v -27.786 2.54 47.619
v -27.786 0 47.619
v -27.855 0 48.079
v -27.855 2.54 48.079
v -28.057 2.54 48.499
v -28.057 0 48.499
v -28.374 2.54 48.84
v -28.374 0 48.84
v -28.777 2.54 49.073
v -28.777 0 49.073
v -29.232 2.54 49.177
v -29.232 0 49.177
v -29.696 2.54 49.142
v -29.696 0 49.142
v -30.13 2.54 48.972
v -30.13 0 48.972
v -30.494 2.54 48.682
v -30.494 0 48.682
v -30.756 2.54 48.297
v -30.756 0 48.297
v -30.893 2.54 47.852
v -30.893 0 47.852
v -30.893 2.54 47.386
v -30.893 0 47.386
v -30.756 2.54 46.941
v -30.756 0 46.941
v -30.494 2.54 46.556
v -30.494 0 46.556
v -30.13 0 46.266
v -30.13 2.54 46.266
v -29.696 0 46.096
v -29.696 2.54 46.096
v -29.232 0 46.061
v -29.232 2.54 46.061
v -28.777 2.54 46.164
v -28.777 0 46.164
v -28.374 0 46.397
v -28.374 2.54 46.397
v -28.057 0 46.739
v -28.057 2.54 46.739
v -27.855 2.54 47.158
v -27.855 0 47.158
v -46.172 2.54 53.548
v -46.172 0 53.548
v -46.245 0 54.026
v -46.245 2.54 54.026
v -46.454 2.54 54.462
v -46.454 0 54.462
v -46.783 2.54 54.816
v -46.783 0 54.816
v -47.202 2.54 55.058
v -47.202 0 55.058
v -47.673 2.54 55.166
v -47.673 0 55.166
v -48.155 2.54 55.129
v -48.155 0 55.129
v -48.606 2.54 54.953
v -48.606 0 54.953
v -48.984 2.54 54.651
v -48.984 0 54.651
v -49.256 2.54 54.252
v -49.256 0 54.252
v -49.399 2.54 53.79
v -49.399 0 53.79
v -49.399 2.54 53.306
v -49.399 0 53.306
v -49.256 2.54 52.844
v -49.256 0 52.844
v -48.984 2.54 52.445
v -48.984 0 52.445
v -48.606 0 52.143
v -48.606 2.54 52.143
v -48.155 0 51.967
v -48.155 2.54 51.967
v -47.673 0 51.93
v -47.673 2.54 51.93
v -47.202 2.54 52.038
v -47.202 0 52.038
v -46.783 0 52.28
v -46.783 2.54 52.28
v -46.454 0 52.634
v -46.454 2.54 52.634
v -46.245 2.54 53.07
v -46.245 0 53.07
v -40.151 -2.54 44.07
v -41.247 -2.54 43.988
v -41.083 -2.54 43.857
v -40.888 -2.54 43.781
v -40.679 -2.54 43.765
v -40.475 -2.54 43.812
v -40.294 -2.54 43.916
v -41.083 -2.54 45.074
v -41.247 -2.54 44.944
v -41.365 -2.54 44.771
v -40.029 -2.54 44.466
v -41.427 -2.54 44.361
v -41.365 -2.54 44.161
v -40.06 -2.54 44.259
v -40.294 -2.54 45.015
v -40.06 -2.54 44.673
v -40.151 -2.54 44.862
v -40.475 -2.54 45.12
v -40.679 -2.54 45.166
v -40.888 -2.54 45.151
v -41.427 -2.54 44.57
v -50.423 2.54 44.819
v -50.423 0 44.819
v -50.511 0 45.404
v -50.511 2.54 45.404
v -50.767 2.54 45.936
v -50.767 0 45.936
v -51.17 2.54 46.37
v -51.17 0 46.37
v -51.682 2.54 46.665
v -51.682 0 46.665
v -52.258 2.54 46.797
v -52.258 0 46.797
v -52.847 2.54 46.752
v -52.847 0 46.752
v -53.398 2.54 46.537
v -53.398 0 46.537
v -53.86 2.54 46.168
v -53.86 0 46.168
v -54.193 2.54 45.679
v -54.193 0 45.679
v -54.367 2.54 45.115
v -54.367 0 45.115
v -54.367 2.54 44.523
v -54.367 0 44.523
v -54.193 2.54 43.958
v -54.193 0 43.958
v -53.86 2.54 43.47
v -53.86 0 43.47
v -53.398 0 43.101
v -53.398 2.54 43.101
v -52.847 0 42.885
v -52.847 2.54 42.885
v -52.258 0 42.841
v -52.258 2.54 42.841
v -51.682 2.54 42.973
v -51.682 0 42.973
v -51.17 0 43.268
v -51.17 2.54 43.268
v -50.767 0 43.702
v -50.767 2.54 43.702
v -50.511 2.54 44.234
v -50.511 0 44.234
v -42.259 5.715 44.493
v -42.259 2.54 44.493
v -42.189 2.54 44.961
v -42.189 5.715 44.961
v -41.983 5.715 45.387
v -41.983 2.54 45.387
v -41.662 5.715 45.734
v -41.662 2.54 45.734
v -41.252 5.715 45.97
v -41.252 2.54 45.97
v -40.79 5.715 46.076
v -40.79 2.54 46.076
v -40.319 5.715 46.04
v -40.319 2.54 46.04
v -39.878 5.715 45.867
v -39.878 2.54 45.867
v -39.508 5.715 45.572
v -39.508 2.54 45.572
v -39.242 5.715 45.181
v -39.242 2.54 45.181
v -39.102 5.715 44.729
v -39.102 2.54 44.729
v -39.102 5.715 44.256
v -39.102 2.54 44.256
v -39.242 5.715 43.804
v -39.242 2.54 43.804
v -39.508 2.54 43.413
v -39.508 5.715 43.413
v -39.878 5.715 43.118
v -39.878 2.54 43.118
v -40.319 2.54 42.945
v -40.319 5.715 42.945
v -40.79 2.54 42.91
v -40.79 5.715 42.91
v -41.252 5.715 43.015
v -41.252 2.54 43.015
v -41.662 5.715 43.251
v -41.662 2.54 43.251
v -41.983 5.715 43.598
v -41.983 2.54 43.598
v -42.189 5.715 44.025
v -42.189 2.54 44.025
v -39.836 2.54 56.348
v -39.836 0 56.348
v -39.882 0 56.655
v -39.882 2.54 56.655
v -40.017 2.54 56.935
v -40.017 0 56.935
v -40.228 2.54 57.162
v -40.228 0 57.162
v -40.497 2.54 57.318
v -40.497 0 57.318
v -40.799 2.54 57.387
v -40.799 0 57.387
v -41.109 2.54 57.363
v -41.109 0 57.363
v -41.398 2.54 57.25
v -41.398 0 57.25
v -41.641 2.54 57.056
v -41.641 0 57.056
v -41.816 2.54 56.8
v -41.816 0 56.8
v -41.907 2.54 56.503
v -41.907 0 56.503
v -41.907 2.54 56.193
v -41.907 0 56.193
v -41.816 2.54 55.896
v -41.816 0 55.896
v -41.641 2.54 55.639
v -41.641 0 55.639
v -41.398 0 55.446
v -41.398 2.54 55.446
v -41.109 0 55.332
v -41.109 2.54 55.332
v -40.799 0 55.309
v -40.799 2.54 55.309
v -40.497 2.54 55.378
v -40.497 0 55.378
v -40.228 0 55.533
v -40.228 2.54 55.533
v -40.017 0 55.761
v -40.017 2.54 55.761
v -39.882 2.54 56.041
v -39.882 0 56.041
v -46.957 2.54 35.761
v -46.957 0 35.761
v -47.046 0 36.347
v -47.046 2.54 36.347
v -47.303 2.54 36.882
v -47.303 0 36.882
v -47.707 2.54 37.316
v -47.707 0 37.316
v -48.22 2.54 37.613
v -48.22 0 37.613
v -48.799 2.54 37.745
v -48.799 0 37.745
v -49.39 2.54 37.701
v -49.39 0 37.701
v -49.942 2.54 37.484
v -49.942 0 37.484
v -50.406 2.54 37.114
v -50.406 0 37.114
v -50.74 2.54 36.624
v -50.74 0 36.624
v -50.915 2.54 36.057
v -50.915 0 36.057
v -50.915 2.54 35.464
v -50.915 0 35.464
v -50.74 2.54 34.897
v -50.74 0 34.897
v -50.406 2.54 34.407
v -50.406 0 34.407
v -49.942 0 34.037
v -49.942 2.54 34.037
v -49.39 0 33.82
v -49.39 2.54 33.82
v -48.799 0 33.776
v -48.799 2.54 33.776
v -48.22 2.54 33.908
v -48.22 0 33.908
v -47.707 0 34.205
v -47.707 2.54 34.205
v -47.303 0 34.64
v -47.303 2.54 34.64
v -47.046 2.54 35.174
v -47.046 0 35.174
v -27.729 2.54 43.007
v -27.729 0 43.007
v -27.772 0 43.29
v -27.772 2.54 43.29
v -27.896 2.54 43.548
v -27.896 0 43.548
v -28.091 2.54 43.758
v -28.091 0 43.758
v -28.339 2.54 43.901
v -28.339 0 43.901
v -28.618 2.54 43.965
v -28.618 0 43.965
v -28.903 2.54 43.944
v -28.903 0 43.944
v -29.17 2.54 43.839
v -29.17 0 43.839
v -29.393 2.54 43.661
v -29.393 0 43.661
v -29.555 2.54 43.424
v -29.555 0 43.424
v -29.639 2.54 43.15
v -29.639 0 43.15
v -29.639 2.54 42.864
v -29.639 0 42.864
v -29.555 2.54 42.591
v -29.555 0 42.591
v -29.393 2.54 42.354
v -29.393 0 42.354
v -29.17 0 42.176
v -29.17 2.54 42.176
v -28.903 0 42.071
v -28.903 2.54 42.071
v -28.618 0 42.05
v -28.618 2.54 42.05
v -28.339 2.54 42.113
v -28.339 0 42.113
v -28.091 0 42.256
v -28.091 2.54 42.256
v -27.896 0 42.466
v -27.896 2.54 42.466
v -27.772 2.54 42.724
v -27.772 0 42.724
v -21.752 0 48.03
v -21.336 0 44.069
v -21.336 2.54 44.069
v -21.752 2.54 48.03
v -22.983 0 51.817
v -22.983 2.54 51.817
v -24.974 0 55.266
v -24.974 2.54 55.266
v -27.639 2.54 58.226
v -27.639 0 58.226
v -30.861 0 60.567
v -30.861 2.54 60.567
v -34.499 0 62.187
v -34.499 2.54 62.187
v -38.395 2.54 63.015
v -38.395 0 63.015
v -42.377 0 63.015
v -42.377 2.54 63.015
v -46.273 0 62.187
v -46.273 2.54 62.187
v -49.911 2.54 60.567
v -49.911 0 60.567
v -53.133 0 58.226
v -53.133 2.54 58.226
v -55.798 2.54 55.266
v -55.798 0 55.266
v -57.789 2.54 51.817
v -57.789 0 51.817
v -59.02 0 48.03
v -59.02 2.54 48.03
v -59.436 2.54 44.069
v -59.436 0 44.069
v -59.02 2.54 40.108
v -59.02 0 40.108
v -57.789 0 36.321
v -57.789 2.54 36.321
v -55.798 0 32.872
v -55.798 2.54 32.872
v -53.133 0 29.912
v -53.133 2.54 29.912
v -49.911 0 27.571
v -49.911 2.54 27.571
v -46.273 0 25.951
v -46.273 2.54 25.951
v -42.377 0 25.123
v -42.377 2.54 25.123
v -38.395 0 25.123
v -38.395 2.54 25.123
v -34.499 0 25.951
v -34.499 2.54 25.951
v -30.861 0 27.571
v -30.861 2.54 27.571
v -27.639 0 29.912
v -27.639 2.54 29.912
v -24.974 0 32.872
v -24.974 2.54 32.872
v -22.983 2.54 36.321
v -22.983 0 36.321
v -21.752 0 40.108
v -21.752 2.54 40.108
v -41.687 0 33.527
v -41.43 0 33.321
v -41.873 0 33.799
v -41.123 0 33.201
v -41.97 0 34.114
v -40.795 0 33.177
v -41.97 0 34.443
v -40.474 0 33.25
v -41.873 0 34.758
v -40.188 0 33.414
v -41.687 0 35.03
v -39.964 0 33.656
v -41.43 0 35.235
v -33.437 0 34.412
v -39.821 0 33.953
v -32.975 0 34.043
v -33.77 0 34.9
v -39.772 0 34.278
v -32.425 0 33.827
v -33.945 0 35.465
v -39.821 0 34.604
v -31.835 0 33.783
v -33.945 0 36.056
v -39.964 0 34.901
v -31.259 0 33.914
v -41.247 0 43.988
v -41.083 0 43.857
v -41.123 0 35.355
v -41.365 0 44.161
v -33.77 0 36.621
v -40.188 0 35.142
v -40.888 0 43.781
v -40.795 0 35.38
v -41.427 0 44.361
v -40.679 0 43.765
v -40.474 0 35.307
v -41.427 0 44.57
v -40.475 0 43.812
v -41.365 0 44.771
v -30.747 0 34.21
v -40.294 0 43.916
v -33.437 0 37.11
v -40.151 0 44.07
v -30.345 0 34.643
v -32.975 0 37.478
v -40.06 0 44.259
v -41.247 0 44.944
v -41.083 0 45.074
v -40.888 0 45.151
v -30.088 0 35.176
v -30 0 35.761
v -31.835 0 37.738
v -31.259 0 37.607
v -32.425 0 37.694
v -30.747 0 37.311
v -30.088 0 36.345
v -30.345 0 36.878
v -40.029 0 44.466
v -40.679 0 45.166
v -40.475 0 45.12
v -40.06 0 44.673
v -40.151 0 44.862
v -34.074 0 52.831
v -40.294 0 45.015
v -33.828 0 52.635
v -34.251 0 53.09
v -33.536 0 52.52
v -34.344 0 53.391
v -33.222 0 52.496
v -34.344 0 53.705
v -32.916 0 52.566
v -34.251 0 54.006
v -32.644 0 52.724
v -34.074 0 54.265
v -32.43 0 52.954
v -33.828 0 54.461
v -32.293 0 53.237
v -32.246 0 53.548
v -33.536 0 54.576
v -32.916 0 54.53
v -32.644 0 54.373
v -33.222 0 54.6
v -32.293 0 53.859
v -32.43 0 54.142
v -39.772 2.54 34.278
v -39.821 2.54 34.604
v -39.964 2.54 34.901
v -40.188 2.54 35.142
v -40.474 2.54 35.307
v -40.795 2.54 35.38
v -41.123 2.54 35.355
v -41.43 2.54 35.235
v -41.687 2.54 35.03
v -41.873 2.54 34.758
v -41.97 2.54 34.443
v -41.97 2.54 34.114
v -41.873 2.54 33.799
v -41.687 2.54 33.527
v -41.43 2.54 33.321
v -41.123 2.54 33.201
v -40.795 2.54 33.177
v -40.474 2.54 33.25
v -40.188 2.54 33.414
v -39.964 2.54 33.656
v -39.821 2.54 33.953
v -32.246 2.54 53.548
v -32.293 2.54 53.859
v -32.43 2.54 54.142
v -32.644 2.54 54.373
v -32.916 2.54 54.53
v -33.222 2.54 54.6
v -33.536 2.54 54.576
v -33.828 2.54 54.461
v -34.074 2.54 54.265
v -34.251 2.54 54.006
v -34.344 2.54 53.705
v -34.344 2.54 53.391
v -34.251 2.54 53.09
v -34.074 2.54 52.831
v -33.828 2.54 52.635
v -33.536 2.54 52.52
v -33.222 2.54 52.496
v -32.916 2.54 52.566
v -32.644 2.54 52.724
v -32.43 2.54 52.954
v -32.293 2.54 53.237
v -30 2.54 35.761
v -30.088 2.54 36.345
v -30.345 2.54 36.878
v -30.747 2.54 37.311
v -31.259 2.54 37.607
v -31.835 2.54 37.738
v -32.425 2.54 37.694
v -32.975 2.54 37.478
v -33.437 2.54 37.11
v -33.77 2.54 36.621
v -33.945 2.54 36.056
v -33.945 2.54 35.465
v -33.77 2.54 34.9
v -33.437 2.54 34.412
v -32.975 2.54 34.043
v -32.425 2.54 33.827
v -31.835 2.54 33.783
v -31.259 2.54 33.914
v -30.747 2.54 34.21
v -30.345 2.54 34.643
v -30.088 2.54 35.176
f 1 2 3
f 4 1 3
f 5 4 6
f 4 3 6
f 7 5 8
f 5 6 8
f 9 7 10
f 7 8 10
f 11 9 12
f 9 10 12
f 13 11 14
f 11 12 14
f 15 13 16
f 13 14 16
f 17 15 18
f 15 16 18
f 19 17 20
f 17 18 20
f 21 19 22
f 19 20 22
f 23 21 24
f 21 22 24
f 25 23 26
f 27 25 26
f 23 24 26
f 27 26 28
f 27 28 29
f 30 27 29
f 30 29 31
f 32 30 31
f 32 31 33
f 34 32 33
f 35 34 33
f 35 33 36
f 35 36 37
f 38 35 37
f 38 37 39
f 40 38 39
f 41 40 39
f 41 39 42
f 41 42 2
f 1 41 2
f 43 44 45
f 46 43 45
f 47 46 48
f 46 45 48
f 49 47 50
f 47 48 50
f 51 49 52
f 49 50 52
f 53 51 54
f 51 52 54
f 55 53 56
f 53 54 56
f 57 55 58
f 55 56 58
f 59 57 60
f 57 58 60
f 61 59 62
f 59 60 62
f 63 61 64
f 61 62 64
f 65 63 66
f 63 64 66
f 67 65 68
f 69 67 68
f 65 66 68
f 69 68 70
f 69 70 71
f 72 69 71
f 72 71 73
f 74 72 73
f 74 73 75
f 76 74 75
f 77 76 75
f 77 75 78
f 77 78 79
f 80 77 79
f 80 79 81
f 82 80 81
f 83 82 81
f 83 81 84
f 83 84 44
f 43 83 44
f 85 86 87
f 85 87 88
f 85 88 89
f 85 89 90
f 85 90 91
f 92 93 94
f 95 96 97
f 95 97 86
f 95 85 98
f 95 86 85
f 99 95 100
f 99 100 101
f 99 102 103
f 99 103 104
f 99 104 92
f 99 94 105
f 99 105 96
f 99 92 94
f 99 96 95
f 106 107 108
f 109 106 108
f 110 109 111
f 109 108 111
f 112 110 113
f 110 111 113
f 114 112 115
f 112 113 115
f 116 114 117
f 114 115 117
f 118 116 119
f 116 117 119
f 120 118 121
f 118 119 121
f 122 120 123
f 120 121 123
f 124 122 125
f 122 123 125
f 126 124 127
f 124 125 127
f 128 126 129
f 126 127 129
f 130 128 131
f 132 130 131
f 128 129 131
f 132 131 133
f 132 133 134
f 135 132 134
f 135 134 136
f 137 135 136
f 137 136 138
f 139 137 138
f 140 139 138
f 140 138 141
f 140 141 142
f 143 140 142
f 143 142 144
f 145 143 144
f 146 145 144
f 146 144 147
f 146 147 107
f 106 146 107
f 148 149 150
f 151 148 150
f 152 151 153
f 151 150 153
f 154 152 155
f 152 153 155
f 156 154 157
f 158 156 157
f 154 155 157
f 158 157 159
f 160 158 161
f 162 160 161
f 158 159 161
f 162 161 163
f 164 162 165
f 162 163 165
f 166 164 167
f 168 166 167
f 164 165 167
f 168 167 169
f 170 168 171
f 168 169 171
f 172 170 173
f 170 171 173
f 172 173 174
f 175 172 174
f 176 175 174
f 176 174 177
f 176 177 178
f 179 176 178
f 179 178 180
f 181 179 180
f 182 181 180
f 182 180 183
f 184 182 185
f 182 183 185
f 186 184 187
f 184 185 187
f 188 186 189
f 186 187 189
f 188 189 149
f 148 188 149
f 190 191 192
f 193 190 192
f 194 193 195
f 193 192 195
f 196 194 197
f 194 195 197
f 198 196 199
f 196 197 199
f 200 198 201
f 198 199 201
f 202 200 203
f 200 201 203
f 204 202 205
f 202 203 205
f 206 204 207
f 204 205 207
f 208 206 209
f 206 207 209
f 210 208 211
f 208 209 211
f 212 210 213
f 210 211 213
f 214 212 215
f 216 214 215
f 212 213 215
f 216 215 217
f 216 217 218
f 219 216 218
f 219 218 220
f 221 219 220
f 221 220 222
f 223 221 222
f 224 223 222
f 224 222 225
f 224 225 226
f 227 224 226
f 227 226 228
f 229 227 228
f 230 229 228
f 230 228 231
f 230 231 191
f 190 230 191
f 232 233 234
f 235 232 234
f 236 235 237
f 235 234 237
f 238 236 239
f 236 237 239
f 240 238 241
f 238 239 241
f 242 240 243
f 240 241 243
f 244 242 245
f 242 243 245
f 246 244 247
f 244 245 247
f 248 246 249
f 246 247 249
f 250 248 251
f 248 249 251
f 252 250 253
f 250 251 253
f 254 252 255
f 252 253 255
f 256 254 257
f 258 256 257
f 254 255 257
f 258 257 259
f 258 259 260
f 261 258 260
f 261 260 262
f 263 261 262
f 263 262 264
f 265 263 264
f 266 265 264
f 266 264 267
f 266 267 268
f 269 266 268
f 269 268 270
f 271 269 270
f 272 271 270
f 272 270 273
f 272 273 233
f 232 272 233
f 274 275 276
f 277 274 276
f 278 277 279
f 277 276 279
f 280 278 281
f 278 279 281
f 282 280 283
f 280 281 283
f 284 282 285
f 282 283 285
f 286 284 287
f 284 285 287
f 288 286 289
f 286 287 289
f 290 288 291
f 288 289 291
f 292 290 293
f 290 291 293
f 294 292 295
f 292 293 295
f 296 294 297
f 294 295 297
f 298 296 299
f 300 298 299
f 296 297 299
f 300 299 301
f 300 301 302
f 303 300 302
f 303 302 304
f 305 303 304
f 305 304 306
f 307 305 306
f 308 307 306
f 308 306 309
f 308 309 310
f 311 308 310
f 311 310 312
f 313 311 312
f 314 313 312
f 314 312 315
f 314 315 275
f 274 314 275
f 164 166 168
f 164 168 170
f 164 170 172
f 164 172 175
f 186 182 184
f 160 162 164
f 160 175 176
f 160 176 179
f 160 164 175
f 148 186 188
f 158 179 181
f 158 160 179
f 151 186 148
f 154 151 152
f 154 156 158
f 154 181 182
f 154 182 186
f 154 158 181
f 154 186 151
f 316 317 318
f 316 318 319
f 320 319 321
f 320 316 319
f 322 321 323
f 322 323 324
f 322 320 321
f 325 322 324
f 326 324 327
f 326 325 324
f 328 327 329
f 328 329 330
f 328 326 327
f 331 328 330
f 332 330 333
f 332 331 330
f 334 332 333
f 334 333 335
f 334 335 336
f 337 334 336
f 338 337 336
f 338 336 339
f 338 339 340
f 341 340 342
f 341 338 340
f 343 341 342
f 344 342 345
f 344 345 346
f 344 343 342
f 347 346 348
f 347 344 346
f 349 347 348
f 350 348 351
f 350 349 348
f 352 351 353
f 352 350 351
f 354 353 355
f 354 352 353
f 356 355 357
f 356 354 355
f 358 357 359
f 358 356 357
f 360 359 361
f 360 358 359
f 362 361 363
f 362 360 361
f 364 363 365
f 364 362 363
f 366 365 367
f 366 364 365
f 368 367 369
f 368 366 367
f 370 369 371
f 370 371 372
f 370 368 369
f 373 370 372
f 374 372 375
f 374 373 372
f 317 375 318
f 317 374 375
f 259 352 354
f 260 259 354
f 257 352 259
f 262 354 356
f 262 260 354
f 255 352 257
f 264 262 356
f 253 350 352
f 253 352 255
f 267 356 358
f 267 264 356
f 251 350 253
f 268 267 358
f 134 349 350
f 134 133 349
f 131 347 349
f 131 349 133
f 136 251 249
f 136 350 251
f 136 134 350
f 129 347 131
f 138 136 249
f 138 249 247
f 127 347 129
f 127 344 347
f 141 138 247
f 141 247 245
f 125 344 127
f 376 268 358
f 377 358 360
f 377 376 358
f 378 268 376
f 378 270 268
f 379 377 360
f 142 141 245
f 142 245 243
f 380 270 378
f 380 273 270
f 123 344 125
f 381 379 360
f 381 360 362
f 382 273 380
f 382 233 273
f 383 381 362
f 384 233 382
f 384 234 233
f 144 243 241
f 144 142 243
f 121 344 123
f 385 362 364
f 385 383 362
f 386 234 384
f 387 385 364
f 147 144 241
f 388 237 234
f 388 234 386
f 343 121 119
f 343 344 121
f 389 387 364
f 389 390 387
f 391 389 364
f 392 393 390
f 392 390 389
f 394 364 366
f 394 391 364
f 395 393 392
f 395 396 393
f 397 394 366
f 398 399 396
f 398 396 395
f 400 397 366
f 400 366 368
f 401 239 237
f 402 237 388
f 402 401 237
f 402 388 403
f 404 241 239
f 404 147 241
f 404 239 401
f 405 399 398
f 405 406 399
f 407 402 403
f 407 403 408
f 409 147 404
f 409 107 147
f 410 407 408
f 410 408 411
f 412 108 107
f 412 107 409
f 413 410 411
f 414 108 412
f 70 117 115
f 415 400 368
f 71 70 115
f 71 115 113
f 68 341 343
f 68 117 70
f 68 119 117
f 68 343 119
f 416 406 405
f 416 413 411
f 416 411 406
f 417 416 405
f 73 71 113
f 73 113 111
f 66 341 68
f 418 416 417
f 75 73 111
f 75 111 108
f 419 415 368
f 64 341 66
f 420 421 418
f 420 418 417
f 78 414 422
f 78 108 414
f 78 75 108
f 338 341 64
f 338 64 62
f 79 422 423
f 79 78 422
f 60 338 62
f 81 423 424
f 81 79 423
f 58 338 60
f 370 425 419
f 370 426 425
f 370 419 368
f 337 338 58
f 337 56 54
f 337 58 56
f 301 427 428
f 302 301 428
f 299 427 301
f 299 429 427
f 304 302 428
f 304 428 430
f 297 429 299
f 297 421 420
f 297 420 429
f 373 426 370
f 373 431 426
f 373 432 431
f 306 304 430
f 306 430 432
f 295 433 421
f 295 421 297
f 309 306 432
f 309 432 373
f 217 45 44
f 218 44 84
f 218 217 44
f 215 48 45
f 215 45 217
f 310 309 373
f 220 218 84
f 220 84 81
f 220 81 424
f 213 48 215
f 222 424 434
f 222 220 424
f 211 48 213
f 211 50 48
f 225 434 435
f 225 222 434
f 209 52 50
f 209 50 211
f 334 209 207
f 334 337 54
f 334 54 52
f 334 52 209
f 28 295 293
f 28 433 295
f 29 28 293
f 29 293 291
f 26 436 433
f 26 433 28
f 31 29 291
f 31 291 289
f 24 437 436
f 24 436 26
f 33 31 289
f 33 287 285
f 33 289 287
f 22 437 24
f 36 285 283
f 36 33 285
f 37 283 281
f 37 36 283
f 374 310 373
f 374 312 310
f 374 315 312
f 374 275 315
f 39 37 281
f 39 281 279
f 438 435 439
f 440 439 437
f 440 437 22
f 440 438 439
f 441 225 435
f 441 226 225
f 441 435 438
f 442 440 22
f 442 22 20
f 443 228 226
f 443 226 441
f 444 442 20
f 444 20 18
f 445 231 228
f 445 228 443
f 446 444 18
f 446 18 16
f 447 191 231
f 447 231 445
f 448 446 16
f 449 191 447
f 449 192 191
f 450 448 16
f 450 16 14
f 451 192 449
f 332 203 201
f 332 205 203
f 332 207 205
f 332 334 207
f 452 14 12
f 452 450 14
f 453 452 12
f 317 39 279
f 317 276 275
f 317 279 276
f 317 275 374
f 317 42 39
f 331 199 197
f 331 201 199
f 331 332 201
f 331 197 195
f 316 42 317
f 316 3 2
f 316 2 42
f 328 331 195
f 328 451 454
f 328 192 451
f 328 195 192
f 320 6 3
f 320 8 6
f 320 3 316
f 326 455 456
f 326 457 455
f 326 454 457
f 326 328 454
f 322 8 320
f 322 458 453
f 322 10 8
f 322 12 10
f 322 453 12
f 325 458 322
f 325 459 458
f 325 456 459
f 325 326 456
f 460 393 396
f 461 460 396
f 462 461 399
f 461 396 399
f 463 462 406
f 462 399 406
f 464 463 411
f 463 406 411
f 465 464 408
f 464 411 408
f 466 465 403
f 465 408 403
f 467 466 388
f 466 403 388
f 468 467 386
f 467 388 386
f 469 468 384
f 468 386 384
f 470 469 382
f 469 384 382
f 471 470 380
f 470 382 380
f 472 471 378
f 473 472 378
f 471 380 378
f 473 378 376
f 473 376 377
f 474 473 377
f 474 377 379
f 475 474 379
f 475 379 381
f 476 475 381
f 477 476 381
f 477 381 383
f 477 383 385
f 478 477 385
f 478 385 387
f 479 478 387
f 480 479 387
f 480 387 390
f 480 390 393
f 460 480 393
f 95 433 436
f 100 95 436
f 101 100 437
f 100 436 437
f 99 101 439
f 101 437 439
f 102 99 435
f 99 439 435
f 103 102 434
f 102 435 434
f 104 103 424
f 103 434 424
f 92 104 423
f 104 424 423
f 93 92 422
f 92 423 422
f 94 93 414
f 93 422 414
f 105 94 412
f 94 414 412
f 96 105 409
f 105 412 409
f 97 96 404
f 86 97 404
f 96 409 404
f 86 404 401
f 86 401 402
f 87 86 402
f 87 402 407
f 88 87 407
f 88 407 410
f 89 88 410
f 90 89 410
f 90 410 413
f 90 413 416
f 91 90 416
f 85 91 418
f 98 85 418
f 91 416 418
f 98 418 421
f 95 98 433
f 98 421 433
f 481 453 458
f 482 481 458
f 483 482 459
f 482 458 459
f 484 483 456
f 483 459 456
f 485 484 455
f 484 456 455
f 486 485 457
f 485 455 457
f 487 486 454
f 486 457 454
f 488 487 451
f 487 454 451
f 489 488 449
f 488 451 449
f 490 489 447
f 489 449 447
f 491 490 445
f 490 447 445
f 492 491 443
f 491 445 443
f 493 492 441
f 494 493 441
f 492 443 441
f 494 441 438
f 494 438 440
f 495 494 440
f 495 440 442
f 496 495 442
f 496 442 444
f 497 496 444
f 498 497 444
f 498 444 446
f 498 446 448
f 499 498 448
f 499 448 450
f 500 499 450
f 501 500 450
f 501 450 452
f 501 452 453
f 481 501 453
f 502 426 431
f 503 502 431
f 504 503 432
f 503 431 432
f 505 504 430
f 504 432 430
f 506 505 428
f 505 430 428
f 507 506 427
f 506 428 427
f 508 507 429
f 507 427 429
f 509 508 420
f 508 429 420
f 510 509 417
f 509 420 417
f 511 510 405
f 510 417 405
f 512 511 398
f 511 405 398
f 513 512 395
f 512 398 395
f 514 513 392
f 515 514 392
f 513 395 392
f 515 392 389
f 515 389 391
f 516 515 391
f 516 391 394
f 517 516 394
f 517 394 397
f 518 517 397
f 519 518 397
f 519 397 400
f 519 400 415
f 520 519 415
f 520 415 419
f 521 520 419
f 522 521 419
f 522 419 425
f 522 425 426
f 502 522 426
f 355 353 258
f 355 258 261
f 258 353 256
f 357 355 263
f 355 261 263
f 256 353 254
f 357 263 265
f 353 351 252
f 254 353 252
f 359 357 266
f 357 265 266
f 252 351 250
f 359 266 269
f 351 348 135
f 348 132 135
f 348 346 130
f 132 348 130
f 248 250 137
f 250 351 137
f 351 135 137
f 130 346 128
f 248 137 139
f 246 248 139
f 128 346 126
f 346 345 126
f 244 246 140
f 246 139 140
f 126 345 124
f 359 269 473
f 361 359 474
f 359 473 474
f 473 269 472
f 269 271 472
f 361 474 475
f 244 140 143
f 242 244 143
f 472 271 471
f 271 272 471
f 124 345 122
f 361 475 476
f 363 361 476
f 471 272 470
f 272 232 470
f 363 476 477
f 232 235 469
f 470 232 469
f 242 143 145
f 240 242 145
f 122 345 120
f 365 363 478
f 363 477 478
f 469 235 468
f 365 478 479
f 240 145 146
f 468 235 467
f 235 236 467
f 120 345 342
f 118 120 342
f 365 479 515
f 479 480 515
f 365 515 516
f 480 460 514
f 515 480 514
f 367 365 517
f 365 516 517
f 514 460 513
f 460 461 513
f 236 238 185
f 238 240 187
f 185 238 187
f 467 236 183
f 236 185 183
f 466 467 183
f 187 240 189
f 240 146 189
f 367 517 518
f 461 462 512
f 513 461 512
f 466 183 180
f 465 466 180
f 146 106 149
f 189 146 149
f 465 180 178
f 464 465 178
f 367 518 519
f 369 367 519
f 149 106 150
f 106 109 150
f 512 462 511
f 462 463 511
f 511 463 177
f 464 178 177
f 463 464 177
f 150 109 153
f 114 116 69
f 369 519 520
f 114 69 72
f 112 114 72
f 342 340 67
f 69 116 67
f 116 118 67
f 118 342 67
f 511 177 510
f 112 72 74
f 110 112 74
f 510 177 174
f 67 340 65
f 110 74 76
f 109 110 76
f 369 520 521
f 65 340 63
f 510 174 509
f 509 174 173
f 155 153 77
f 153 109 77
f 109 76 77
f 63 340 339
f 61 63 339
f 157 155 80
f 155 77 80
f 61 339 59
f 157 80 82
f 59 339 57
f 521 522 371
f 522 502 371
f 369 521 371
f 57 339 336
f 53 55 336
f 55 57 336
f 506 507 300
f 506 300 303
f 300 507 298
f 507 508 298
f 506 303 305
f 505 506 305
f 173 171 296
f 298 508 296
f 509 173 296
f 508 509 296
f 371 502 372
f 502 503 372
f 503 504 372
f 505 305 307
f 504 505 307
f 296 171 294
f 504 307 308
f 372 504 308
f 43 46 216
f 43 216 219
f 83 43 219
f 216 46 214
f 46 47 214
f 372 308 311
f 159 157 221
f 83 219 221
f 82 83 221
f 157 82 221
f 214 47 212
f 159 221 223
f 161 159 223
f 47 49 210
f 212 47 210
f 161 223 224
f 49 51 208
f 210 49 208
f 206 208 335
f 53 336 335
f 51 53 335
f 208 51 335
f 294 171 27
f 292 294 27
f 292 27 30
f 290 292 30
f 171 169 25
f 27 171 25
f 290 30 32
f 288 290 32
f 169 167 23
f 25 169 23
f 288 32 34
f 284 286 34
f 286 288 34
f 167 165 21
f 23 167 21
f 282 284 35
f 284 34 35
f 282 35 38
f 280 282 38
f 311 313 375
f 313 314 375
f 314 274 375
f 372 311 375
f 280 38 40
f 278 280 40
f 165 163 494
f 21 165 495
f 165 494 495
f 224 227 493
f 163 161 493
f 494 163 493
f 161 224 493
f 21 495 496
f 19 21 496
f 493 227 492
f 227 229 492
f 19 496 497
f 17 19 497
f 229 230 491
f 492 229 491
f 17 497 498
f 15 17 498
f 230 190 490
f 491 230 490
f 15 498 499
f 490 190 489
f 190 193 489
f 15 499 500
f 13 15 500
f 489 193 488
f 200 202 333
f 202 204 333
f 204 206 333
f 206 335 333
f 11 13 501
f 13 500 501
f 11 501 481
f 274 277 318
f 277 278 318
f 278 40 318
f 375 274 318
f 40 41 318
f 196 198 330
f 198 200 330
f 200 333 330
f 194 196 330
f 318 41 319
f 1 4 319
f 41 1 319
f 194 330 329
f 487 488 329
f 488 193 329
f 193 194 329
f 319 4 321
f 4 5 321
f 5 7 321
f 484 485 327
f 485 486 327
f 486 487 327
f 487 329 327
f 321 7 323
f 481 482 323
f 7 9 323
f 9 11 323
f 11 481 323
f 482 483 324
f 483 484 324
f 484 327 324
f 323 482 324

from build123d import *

# Parameters (mm, degrees)
F0_R     = 19.05
F1_DEPTH = 2.54
F3_R     = 1.041647
F3_R_2   = 1.054587
F3_R_3   = 1.562468
F3_R_4   = 0.960349
F3_R_5   = 1.983236
F3_R_6   = 1.104833
F3_R_7   = 1.99006
F3_R_8   = 1.983233
F3_R_9   = 1.622095
F4_DEPTH = 25.4
F6_R     = 0.702637
F7_DEPTH = 2.54
F8_R     = 1.5875
F9_DEPTH = 3.175


with BuildPart() as f1:
    # F0 (on Front) → F1 (new body)
    with BuildSketch(Plane.XZ):
        with Locations((-40.385999, 44.069)):
            Circle(F0_R)
    extrude(amount=-F1_DEPTH)

    # F3 (on face) → F4 (cut)
    with BuildSketch(Plane.XZ):
        with Locations((-40.877204, 56.347888)):
            Circle(F3_R)
        with Locations((-33.301067, 53.548012)):
            Circle(F3_R_2)
        with Locations((-29.348301, 47.618862)):
            Circle(F3_R_3)
        with Locations((-28.689506, 43.007299)):
            Circle(F3_R_4)
        with Locations((-31.98348, 35.760563)):
            Circle(F3_R_5)
        with Locations((-40.877204, 34.278274)):
            Circle(F3_R_6)
        with Locations((-48.947435, 35.760563)):
            Circle(F3_R_7)
        with Locations((-52.406106, 44.818986)):
            Circle(F3_R_8)
        with Locations((-47.794547, 53.548012)):
            Circle(F3_R_9)
    extrude(amount=-F4_DEPTH, mode=Mode.SUBTRACT)

    # F6 (on face) → F7 (join)
    with BuildSketch(Plane.XZ):
        with Locations((-40.731799, 44.465709)):
            Circle(F6_R)
    extrude(amount=F7_DEPTH)

    # F8 (on face) → F9 (join)
    with BuildSketch(Plane(origin=(0, 2.54, 0), x_dir=(-1, 0, 0), z_dir=(0, 1, 0))):
        with Locations((40.671818, 44.492617)):
            Circle(F8_R)
    extrude(amount=F9_DEPTH)


solid = f1.part
